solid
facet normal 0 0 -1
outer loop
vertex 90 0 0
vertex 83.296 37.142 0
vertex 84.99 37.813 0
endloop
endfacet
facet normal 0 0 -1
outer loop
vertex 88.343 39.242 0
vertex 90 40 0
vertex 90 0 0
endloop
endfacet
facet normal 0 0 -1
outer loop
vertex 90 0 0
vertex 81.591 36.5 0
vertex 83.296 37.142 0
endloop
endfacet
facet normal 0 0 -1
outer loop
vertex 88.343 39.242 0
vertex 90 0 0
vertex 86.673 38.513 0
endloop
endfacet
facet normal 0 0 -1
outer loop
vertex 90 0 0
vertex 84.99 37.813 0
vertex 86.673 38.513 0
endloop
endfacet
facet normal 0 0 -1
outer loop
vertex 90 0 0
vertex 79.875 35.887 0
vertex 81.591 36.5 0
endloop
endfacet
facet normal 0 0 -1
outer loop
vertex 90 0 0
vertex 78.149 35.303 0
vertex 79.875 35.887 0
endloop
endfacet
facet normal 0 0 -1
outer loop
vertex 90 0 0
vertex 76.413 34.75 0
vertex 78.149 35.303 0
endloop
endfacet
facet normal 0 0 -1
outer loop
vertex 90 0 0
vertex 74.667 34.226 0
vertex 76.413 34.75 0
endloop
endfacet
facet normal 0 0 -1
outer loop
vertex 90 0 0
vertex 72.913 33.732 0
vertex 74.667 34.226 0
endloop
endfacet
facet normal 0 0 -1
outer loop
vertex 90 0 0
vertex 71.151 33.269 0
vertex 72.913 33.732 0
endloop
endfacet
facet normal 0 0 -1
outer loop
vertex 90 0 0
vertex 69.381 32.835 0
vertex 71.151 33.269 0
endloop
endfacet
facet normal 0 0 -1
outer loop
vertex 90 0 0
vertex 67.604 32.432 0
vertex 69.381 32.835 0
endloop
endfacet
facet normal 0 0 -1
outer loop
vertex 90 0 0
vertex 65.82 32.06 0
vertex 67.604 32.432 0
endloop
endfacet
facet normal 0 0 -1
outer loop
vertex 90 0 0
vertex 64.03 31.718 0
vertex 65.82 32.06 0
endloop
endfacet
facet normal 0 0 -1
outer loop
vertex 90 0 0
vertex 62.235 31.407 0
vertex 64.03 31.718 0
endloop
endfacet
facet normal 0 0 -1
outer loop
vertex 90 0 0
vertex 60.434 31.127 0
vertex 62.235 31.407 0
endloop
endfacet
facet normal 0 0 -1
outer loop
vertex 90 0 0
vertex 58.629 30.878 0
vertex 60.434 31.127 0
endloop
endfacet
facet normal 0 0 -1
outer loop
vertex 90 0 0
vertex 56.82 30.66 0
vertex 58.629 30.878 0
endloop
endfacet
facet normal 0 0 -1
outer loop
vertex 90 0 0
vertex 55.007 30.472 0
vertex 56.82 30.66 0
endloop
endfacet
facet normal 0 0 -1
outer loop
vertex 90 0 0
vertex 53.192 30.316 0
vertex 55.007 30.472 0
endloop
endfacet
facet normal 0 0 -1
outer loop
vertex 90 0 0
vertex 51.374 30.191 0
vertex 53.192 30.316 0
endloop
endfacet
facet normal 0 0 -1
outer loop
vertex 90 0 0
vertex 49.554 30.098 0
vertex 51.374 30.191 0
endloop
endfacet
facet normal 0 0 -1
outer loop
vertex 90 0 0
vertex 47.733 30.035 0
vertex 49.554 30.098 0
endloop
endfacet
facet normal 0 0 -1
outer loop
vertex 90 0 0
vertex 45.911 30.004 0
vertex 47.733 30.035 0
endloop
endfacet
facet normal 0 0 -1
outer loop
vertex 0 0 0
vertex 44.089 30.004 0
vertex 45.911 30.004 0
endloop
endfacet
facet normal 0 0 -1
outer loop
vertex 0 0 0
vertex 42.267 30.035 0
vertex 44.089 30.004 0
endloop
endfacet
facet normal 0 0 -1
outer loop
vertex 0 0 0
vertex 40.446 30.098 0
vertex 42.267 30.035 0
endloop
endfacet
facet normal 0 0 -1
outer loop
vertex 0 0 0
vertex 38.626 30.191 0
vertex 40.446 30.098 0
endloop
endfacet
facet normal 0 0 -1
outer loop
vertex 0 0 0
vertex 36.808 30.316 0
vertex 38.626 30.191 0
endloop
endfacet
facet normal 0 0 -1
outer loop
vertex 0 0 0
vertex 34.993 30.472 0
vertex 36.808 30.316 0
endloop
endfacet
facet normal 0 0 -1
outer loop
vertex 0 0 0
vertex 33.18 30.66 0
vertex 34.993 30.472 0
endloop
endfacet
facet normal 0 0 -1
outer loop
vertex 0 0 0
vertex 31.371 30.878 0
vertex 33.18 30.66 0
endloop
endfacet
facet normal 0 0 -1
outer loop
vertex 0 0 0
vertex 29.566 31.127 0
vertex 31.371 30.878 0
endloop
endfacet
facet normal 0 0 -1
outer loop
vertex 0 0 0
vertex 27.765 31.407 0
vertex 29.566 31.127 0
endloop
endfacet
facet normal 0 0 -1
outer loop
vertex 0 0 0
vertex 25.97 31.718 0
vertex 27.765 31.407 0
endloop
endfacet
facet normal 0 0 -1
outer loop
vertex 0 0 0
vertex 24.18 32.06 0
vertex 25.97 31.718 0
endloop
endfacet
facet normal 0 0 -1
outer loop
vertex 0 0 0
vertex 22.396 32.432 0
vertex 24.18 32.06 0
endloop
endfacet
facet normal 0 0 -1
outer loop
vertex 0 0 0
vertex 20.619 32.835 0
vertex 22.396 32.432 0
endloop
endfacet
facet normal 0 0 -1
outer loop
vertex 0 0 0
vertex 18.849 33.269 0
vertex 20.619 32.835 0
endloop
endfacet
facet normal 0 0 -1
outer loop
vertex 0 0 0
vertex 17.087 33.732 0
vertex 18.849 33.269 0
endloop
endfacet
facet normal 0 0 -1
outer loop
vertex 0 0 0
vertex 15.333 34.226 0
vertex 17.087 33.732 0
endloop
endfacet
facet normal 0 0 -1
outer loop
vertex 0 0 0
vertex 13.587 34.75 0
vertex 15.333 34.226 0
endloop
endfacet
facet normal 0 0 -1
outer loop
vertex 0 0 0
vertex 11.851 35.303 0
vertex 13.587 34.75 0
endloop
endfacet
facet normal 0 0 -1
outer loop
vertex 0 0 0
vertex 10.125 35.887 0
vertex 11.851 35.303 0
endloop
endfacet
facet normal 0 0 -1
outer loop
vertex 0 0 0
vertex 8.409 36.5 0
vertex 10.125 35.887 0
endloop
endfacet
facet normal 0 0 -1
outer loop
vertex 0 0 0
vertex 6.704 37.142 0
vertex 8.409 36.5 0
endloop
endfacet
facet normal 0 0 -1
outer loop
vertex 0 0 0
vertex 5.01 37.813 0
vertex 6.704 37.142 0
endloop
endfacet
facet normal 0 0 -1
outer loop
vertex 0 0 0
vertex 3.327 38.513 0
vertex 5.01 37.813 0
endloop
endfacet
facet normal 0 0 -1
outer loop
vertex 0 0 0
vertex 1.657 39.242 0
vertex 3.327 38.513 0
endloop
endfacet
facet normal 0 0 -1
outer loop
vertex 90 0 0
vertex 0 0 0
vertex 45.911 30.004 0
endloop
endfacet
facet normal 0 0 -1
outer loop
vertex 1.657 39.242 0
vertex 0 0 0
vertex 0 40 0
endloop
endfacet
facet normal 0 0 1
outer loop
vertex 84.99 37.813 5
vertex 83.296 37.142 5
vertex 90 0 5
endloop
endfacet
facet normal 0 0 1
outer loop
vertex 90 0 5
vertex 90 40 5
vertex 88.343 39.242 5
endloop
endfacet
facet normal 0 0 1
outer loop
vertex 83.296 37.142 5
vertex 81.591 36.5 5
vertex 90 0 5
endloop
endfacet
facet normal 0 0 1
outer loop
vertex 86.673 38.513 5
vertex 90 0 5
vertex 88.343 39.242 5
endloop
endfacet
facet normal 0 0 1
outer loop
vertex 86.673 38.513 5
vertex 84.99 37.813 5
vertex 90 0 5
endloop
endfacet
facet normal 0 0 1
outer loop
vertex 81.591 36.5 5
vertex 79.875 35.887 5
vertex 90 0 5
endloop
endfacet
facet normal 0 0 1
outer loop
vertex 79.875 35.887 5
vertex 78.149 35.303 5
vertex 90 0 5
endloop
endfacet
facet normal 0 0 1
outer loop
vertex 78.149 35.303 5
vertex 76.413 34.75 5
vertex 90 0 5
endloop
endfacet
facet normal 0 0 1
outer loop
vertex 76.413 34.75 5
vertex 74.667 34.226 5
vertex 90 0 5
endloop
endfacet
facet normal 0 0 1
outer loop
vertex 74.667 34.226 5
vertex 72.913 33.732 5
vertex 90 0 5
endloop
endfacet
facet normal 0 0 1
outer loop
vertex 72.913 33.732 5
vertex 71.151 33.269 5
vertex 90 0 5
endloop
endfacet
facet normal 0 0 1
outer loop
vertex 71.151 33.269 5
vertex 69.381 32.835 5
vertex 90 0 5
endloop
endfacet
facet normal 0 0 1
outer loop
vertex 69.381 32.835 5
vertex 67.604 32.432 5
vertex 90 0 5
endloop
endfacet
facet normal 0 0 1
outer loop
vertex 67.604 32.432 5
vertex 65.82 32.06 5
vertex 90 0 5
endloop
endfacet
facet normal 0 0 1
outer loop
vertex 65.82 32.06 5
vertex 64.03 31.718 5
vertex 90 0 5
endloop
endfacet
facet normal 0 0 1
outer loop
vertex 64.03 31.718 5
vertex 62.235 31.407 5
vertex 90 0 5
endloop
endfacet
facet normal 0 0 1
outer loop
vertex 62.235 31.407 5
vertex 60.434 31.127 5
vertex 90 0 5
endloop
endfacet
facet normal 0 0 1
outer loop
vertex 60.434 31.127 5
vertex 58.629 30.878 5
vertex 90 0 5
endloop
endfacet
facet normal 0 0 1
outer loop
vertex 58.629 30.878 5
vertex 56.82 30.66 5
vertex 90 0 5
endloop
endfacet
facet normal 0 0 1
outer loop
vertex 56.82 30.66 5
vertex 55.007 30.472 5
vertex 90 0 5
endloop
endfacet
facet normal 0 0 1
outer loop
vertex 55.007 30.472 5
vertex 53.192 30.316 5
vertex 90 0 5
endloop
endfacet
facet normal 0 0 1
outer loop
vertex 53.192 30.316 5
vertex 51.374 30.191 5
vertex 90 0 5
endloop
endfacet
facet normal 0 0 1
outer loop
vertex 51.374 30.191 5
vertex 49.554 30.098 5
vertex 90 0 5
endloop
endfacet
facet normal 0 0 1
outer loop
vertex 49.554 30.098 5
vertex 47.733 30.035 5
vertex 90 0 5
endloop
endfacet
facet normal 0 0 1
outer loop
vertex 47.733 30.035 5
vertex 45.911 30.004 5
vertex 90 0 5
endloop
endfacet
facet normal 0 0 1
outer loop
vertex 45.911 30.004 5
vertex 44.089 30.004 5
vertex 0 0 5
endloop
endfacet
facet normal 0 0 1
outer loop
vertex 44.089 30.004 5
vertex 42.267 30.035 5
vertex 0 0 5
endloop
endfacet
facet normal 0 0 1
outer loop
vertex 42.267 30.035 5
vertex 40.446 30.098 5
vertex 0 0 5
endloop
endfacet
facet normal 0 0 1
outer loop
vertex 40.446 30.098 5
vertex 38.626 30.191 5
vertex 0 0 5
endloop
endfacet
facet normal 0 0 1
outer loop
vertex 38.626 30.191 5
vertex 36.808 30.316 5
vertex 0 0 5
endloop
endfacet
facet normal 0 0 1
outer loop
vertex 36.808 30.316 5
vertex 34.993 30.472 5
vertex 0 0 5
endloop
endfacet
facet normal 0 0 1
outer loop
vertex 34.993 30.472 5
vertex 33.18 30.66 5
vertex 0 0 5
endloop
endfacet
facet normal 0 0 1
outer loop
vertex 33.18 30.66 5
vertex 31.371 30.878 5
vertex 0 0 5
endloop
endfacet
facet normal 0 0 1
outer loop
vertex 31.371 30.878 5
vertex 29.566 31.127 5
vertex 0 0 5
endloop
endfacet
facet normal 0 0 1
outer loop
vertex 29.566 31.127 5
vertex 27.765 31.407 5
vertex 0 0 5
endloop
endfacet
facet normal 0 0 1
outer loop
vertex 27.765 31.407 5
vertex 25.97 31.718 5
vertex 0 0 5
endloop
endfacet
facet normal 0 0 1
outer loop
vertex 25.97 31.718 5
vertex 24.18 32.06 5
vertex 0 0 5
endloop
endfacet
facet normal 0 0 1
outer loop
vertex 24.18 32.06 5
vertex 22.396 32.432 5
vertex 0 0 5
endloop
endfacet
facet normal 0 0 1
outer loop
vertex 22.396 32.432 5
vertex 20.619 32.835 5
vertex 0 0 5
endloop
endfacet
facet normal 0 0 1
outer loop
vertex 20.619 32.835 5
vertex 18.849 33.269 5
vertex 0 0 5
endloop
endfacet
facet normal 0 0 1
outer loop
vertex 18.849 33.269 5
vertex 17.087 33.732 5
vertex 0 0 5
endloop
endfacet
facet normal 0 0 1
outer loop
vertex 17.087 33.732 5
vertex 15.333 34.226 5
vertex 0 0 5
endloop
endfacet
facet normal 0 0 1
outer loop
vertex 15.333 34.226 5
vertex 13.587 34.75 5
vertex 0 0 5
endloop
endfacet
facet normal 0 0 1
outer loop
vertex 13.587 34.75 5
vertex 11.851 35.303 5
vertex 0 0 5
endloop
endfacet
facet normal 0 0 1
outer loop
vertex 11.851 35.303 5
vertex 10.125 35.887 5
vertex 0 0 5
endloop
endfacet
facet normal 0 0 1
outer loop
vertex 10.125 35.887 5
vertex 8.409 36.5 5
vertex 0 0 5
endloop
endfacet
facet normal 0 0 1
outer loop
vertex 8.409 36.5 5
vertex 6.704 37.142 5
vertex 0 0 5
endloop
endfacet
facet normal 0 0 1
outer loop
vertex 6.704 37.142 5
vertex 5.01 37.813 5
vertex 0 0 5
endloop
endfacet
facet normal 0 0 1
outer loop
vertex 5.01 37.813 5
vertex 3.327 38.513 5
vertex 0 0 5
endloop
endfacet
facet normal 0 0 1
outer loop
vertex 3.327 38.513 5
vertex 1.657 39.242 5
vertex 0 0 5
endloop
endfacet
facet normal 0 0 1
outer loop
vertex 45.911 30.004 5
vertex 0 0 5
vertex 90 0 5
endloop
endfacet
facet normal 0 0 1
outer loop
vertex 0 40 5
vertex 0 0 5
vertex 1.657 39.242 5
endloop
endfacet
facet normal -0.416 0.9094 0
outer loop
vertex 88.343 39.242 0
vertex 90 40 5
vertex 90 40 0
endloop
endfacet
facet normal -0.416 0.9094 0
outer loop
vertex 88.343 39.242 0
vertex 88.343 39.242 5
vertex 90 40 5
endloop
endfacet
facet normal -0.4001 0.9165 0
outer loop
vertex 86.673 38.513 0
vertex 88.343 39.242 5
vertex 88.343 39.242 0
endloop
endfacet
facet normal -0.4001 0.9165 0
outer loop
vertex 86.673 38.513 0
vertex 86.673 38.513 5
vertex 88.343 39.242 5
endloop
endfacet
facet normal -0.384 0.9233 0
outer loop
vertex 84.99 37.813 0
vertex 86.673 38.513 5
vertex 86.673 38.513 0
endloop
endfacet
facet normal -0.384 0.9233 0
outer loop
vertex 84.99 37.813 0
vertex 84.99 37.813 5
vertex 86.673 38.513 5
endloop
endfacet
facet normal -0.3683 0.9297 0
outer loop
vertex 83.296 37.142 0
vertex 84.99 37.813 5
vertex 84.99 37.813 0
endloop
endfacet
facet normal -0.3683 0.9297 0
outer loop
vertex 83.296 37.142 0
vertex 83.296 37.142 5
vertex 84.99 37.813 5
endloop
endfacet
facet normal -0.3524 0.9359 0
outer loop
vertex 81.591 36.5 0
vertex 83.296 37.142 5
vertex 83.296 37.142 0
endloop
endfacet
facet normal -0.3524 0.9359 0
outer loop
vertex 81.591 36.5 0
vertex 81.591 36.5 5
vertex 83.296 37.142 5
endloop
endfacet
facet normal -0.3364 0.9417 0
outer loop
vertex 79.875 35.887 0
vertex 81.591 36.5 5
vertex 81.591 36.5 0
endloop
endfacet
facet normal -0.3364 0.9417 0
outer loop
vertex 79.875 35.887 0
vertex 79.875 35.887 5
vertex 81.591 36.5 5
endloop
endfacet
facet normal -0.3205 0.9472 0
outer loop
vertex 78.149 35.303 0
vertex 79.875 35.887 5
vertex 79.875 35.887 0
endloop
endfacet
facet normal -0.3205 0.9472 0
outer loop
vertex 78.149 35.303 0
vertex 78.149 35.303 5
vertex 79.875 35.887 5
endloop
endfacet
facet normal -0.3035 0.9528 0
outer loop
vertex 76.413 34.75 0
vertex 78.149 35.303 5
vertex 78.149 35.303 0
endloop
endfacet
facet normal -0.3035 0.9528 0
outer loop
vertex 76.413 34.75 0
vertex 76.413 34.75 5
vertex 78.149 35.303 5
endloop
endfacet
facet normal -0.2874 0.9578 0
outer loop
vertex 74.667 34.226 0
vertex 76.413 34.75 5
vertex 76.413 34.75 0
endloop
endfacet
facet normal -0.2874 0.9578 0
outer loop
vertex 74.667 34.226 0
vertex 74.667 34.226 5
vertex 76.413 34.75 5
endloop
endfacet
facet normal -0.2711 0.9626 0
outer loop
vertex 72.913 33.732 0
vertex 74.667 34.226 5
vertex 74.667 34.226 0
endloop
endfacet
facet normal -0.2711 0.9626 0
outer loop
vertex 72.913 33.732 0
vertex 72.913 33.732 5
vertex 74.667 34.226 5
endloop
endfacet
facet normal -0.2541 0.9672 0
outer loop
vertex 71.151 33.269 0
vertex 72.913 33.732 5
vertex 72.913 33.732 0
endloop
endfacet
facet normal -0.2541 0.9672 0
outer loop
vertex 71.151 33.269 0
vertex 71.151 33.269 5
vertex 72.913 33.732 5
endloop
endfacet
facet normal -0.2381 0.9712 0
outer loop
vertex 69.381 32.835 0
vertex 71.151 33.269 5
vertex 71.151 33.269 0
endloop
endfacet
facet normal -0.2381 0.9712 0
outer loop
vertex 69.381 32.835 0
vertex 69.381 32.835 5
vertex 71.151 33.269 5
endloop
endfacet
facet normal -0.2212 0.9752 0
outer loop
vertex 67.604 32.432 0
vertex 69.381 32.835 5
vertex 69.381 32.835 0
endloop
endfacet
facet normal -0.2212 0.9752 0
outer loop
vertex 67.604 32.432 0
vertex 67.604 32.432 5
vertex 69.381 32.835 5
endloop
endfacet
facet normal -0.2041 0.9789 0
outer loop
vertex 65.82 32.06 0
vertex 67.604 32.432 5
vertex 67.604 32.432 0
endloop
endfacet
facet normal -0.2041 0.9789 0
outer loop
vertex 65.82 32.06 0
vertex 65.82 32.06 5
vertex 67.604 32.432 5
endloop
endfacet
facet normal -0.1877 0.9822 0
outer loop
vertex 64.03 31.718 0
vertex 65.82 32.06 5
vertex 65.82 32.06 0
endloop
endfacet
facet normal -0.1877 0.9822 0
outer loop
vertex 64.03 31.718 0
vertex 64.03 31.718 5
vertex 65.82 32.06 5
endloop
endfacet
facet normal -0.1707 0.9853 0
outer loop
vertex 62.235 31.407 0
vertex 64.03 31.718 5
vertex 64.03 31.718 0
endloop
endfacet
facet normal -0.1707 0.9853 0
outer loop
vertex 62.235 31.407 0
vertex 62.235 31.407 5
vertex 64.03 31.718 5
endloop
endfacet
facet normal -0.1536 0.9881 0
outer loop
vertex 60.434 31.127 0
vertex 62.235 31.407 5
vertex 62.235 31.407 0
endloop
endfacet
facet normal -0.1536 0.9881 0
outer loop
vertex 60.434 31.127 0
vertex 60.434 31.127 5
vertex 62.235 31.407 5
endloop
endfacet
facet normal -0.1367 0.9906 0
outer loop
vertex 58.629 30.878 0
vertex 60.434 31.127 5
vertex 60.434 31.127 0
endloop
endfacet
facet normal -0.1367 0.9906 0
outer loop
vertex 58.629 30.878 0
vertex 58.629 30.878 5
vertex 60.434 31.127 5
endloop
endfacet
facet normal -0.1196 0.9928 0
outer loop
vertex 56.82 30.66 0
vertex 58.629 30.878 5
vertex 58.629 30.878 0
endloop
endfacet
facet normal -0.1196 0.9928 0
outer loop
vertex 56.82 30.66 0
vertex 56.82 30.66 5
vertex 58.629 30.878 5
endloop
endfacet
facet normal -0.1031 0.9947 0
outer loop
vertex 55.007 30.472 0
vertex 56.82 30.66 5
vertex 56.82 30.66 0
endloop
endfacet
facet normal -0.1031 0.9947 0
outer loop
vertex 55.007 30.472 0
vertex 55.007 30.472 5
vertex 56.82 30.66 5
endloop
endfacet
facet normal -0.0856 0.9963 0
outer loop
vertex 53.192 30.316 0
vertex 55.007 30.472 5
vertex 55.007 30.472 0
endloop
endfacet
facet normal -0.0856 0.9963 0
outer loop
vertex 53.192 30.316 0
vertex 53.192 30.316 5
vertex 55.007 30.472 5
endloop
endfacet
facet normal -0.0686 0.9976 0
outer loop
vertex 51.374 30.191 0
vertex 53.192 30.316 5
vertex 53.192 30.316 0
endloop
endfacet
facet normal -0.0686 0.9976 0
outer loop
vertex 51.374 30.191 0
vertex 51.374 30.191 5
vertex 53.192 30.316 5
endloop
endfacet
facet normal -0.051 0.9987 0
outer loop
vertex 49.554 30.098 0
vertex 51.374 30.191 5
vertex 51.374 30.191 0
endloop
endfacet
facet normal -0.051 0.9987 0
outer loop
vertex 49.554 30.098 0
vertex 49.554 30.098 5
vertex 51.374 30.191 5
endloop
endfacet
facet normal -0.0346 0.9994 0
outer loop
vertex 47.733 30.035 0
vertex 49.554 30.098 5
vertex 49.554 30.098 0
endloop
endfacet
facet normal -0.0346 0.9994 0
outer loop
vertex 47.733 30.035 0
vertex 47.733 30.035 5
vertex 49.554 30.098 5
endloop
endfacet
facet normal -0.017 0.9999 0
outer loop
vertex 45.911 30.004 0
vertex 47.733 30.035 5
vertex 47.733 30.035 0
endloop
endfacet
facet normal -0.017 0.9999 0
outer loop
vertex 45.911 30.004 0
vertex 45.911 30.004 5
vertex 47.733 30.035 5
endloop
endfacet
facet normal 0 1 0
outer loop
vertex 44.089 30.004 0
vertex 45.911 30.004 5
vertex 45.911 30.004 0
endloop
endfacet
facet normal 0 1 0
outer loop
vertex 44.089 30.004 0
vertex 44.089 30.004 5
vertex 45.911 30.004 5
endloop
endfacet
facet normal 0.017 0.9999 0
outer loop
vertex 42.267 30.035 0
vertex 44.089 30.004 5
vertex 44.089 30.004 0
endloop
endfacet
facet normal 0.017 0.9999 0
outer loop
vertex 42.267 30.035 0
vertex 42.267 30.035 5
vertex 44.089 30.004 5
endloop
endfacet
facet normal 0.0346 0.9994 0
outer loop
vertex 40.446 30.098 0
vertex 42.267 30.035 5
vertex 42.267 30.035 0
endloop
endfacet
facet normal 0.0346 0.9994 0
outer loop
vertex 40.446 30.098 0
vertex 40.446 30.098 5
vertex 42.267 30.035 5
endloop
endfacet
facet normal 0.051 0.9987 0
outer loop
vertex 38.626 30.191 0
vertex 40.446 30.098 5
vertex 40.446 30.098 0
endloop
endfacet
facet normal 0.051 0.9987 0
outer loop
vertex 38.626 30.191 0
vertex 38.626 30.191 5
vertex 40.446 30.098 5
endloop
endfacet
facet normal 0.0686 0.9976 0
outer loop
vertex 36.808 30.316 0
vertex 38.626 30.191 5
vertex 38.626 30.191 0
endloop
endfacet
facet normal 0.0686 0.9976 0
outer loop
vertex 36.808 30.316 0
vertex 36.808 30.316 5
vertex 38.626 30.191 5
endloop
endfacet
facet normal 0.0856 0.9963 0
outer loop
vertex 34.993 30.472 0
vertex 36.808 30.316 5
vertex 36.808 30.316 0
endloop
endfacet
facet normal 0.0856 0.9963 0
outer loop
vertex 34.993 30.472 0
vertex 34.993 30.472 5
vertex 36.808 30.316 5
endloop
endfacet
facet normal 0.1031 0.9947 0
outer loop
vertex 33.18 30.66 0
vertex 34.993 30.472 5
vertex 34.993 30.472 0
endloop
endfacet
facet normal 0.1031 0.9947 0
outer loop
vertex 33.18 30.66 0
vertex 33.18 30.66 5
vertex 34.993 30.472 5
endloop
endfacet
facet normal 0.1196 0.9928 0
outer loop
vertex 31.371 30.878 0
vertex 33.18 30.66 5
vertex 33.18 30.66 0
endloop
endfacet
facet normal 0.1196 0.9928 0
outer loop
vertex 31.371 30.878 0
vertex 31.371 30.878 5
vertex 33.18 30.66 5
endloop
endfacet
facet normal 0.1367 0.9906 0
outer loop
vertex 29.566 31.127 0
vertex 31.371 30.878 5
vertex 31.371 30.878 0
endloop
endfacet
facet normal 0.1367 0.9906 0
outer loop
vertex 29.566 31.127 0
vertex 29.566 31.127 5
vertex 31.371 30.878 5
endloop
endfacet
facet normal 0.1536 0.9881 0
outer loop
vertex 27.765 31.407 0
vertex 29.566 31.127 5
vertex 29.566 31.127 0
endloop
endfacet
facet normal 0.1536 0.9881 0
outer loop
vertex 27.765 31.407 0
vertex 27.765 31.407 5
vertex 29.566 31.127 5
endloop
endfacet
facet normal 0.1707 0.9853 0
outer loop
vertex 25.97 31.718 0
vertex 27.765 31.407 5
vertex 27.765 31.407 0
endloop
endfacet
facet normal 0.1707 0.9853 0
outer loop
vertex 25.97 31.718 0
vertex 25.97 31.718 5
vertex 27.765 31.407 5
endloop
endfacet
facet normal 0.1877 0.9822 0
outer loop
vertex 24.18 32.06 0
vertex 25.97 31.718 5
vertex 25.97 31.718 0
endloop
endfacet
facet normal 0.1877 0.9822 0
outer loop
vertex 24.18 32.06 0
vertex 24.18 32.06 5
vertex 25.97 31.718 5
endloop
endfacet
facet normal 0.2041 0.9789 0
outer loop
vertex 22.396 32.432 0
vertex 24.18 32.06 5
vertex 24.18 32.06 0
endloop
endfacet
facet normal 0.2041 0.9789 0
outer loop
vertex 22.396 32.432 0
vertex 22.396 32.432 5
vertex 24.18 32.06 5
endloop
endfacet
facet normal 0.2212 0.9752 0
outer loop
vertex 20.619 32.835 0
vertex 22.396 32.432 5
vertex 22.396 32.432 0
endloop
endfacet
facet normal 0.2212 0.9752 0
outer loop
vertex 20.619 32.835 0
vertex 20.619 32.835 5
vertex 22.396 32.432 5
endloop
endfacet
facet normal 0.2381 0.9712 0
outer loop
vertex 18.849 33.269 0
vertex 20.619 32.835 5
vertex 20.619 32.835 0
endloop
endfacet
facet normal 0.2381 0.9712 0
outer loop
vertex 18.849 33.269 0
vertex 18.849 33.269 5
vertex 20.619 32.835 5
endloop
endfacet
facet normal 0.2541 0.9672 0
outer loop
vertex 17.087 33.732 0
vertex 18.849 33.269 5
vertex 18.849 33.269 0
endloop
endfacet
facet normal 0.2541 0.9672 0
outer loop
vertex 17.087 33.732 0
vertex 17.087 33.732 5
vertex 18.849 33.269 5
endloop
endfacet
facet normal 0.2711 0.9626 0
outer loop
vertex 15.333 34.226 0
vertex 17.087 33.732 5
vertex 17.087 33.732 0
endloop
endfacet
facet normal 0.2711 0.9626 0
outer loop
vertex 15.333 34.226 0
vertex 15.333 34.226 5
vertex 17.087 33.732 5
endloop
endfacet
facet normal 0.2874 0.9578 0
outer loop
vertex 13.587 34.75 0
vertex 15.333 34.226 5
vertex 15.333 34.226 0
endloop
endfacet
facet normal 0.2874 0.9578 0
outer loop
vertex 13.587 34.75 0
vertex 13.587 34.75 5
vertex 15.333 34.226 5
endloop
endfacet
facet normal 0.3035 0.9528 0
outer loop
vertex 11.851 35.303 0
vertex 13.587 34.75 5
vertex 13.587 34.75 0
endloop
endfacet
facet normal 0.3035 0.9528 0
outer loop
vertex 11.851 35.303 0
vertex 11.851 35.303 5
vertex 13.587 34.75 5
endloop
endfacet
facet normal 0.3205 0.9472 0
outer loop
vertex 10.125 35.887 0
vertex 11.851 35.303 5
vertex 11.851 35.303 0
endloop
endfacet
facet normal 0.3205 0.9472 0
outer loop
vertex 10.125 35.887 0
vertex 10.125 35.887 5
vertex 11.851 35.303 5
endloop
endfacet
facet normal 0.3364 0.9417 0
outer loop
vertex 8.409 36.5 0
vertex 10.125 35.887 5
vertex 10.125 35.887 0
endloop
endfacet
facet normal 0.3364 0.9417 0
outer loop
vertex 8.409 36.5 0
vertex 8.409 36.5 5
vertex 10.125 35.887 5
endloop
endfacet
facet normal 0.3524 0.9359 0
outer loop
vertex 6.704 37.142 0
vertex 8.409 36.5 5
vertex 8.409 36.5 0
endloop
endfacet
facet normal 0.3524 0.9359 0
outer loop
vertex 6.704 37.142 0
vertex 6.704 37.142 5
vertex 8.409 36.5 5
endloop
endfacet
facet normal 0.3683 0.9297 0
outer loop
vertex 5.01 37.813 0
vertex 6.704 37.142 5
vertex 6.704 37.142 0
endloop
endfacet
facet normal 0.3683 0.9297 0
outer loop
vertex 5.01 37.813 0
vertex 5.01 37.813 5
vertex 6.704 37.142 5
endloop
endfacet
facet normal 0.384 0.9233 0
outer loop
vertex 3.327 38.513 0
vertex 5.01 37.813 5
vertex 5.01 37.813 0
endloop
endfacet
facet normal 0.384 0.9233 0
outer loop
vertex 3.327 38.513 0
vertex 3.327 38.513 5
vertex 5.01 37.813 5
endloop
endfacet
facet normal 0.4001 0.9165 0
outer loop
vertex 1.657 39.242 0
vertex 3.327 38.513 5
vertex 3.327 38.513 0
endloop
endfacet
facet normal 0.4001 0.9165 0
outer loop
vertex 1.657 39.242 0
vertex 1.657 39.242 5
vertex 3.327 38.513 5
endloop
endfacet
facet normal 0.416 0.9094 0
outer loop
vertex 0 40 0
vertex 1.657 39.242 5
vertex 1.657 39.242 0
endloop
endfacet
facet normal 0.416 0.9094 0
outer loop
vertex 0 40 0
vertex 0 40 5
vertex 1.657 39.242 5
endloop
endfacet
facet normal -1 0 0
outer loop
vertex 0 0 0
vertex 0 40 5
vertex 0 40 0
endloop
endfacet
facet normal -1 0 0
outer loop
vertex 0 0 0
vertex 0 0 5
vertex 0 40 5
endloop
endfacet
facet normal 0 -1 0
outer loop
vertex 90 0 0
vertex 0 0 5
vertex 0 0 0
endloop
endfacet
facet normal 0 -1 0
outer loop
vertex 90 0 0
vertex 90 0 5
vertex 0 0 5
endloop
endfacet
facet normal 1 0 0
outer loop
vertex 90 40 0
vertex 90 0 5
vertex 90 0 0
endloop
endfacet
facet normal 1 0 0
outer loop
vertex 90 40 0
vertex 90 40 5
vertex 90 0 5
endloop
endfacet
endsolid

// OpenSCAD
$fn = 32;

// ----------------------------------------------------------------------
// Arc profile plate: notch, 54 points
// ----------------------------------------------------------------------

// --- parameters (mm) ---
bar_l = 90;               // bar length, X
bar_w = 40;               // bar width, Y
notch_depth = 10;         // depth of the arc notch at mid-span
arc_r = 106.25;           // radius of the notch arc
arc_angle = 50.12;        // notch arc angle, degrees
arc_step = 1;             // sampling step of the notch arc, degrees
plate_t = 5;              // plate thickness, Z

profile = [[0, 0], [90, 0], [90, 40], [88.343, 39.242], [86.673, 38.513], [84.99, 37.813], [83.296, 37.142], [81.591, 36.5], [79.875, 35.887], [78.149, 35.303], [76.413, 34.75], [74.667, 34.226], [72.913, 33.732], [71.151, 33.269], [69.381, 32.835], [67.604, 32.432], [65.82, 32.06], [64.03, 31.718], [62.235, 31.407], [60.434, 31.127], [58.629, 30.878], [56.82, 30.66], [55.007, 30.472], [53.192, 30.316], [51.374, 30.191], [49.554, 30.098], [47.733, 30.035], [45.911, 30.004], [44.089, 30.004], [42.267, 30.035], [40.446, 30.098], [38.626, 30.191], [36.808, 30.316], [34.993, 30.472], [33.18, 30.66], [31.371, 30.878], [29.566, 31.127], [27.765, 31.407], [25.97, 31.718], [24.18, 32.06], [22.396, 32.432], [20.619, 32.835], [18.849, 33.269], [17.087, 33.732], [15.333, 34.226], [13.587, 34.75], [11.851, 35.303], [10.125, 35.887], [8.409, 36.5], [6.704, 37.142], [5.01, 37.813], [3.327, 38.513], [1.657, 39.242], [0, 40]];  // primary outline, 54 points, counter clockwise

// --- the one profile operation ---
linear_extrude(height = plate_t) polygon(points = profile);
